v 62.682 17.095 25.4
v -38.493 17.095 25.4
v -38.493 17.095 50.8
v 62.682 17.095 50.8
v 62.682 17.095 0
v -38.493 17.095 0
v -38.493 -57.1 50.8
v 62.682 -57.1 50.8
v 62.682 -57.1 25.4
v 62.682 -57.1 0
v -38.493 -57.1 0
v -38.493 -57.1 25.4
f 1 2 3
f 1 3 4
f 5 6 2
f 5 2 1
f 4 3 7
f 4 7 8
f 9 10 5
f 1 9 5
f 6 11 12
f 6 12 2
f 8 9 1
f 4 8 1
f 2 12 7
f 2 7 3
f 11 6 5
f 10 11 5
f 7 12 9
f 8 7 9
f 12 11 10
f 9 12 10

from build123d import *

# Parameters (mm, degrees)
F0_W      = 101.175439
F0_H      = 74.195322
F1_DEPTH  = 25.4
F1_FACE_W = 101.175438
F1_FACE_H = 74.195322
F2_R      = 19.170113
F3_DEPTH  = 25.4


with BuildPart() as f1:
    # F0 (on Top) → F1 (new body)
    with BuildSketch(Plane.XY):
        with Locations((12.094537, -20.002501)):
            Rectangle(F0_W, F0_H)
    extrude(amount=F1_DEPTH)

    # F1_face (on face) + F2 (on Top) → F3 (join)
    with BuildSketch(Plane(origin=(12.094537, -20.002501, 25.4), x_dir=(1, 0, 0), z_dir=(0, 0, 1))):
        Rectangle(F1_FACE_W, F1_FACE_H)
    with BuildSketch(Plane.XY):
        with Locations((0, -17.327746)):
            Circle(F2_R)
    extrude(amount=F3_DEPTH)


solid = f1.part
